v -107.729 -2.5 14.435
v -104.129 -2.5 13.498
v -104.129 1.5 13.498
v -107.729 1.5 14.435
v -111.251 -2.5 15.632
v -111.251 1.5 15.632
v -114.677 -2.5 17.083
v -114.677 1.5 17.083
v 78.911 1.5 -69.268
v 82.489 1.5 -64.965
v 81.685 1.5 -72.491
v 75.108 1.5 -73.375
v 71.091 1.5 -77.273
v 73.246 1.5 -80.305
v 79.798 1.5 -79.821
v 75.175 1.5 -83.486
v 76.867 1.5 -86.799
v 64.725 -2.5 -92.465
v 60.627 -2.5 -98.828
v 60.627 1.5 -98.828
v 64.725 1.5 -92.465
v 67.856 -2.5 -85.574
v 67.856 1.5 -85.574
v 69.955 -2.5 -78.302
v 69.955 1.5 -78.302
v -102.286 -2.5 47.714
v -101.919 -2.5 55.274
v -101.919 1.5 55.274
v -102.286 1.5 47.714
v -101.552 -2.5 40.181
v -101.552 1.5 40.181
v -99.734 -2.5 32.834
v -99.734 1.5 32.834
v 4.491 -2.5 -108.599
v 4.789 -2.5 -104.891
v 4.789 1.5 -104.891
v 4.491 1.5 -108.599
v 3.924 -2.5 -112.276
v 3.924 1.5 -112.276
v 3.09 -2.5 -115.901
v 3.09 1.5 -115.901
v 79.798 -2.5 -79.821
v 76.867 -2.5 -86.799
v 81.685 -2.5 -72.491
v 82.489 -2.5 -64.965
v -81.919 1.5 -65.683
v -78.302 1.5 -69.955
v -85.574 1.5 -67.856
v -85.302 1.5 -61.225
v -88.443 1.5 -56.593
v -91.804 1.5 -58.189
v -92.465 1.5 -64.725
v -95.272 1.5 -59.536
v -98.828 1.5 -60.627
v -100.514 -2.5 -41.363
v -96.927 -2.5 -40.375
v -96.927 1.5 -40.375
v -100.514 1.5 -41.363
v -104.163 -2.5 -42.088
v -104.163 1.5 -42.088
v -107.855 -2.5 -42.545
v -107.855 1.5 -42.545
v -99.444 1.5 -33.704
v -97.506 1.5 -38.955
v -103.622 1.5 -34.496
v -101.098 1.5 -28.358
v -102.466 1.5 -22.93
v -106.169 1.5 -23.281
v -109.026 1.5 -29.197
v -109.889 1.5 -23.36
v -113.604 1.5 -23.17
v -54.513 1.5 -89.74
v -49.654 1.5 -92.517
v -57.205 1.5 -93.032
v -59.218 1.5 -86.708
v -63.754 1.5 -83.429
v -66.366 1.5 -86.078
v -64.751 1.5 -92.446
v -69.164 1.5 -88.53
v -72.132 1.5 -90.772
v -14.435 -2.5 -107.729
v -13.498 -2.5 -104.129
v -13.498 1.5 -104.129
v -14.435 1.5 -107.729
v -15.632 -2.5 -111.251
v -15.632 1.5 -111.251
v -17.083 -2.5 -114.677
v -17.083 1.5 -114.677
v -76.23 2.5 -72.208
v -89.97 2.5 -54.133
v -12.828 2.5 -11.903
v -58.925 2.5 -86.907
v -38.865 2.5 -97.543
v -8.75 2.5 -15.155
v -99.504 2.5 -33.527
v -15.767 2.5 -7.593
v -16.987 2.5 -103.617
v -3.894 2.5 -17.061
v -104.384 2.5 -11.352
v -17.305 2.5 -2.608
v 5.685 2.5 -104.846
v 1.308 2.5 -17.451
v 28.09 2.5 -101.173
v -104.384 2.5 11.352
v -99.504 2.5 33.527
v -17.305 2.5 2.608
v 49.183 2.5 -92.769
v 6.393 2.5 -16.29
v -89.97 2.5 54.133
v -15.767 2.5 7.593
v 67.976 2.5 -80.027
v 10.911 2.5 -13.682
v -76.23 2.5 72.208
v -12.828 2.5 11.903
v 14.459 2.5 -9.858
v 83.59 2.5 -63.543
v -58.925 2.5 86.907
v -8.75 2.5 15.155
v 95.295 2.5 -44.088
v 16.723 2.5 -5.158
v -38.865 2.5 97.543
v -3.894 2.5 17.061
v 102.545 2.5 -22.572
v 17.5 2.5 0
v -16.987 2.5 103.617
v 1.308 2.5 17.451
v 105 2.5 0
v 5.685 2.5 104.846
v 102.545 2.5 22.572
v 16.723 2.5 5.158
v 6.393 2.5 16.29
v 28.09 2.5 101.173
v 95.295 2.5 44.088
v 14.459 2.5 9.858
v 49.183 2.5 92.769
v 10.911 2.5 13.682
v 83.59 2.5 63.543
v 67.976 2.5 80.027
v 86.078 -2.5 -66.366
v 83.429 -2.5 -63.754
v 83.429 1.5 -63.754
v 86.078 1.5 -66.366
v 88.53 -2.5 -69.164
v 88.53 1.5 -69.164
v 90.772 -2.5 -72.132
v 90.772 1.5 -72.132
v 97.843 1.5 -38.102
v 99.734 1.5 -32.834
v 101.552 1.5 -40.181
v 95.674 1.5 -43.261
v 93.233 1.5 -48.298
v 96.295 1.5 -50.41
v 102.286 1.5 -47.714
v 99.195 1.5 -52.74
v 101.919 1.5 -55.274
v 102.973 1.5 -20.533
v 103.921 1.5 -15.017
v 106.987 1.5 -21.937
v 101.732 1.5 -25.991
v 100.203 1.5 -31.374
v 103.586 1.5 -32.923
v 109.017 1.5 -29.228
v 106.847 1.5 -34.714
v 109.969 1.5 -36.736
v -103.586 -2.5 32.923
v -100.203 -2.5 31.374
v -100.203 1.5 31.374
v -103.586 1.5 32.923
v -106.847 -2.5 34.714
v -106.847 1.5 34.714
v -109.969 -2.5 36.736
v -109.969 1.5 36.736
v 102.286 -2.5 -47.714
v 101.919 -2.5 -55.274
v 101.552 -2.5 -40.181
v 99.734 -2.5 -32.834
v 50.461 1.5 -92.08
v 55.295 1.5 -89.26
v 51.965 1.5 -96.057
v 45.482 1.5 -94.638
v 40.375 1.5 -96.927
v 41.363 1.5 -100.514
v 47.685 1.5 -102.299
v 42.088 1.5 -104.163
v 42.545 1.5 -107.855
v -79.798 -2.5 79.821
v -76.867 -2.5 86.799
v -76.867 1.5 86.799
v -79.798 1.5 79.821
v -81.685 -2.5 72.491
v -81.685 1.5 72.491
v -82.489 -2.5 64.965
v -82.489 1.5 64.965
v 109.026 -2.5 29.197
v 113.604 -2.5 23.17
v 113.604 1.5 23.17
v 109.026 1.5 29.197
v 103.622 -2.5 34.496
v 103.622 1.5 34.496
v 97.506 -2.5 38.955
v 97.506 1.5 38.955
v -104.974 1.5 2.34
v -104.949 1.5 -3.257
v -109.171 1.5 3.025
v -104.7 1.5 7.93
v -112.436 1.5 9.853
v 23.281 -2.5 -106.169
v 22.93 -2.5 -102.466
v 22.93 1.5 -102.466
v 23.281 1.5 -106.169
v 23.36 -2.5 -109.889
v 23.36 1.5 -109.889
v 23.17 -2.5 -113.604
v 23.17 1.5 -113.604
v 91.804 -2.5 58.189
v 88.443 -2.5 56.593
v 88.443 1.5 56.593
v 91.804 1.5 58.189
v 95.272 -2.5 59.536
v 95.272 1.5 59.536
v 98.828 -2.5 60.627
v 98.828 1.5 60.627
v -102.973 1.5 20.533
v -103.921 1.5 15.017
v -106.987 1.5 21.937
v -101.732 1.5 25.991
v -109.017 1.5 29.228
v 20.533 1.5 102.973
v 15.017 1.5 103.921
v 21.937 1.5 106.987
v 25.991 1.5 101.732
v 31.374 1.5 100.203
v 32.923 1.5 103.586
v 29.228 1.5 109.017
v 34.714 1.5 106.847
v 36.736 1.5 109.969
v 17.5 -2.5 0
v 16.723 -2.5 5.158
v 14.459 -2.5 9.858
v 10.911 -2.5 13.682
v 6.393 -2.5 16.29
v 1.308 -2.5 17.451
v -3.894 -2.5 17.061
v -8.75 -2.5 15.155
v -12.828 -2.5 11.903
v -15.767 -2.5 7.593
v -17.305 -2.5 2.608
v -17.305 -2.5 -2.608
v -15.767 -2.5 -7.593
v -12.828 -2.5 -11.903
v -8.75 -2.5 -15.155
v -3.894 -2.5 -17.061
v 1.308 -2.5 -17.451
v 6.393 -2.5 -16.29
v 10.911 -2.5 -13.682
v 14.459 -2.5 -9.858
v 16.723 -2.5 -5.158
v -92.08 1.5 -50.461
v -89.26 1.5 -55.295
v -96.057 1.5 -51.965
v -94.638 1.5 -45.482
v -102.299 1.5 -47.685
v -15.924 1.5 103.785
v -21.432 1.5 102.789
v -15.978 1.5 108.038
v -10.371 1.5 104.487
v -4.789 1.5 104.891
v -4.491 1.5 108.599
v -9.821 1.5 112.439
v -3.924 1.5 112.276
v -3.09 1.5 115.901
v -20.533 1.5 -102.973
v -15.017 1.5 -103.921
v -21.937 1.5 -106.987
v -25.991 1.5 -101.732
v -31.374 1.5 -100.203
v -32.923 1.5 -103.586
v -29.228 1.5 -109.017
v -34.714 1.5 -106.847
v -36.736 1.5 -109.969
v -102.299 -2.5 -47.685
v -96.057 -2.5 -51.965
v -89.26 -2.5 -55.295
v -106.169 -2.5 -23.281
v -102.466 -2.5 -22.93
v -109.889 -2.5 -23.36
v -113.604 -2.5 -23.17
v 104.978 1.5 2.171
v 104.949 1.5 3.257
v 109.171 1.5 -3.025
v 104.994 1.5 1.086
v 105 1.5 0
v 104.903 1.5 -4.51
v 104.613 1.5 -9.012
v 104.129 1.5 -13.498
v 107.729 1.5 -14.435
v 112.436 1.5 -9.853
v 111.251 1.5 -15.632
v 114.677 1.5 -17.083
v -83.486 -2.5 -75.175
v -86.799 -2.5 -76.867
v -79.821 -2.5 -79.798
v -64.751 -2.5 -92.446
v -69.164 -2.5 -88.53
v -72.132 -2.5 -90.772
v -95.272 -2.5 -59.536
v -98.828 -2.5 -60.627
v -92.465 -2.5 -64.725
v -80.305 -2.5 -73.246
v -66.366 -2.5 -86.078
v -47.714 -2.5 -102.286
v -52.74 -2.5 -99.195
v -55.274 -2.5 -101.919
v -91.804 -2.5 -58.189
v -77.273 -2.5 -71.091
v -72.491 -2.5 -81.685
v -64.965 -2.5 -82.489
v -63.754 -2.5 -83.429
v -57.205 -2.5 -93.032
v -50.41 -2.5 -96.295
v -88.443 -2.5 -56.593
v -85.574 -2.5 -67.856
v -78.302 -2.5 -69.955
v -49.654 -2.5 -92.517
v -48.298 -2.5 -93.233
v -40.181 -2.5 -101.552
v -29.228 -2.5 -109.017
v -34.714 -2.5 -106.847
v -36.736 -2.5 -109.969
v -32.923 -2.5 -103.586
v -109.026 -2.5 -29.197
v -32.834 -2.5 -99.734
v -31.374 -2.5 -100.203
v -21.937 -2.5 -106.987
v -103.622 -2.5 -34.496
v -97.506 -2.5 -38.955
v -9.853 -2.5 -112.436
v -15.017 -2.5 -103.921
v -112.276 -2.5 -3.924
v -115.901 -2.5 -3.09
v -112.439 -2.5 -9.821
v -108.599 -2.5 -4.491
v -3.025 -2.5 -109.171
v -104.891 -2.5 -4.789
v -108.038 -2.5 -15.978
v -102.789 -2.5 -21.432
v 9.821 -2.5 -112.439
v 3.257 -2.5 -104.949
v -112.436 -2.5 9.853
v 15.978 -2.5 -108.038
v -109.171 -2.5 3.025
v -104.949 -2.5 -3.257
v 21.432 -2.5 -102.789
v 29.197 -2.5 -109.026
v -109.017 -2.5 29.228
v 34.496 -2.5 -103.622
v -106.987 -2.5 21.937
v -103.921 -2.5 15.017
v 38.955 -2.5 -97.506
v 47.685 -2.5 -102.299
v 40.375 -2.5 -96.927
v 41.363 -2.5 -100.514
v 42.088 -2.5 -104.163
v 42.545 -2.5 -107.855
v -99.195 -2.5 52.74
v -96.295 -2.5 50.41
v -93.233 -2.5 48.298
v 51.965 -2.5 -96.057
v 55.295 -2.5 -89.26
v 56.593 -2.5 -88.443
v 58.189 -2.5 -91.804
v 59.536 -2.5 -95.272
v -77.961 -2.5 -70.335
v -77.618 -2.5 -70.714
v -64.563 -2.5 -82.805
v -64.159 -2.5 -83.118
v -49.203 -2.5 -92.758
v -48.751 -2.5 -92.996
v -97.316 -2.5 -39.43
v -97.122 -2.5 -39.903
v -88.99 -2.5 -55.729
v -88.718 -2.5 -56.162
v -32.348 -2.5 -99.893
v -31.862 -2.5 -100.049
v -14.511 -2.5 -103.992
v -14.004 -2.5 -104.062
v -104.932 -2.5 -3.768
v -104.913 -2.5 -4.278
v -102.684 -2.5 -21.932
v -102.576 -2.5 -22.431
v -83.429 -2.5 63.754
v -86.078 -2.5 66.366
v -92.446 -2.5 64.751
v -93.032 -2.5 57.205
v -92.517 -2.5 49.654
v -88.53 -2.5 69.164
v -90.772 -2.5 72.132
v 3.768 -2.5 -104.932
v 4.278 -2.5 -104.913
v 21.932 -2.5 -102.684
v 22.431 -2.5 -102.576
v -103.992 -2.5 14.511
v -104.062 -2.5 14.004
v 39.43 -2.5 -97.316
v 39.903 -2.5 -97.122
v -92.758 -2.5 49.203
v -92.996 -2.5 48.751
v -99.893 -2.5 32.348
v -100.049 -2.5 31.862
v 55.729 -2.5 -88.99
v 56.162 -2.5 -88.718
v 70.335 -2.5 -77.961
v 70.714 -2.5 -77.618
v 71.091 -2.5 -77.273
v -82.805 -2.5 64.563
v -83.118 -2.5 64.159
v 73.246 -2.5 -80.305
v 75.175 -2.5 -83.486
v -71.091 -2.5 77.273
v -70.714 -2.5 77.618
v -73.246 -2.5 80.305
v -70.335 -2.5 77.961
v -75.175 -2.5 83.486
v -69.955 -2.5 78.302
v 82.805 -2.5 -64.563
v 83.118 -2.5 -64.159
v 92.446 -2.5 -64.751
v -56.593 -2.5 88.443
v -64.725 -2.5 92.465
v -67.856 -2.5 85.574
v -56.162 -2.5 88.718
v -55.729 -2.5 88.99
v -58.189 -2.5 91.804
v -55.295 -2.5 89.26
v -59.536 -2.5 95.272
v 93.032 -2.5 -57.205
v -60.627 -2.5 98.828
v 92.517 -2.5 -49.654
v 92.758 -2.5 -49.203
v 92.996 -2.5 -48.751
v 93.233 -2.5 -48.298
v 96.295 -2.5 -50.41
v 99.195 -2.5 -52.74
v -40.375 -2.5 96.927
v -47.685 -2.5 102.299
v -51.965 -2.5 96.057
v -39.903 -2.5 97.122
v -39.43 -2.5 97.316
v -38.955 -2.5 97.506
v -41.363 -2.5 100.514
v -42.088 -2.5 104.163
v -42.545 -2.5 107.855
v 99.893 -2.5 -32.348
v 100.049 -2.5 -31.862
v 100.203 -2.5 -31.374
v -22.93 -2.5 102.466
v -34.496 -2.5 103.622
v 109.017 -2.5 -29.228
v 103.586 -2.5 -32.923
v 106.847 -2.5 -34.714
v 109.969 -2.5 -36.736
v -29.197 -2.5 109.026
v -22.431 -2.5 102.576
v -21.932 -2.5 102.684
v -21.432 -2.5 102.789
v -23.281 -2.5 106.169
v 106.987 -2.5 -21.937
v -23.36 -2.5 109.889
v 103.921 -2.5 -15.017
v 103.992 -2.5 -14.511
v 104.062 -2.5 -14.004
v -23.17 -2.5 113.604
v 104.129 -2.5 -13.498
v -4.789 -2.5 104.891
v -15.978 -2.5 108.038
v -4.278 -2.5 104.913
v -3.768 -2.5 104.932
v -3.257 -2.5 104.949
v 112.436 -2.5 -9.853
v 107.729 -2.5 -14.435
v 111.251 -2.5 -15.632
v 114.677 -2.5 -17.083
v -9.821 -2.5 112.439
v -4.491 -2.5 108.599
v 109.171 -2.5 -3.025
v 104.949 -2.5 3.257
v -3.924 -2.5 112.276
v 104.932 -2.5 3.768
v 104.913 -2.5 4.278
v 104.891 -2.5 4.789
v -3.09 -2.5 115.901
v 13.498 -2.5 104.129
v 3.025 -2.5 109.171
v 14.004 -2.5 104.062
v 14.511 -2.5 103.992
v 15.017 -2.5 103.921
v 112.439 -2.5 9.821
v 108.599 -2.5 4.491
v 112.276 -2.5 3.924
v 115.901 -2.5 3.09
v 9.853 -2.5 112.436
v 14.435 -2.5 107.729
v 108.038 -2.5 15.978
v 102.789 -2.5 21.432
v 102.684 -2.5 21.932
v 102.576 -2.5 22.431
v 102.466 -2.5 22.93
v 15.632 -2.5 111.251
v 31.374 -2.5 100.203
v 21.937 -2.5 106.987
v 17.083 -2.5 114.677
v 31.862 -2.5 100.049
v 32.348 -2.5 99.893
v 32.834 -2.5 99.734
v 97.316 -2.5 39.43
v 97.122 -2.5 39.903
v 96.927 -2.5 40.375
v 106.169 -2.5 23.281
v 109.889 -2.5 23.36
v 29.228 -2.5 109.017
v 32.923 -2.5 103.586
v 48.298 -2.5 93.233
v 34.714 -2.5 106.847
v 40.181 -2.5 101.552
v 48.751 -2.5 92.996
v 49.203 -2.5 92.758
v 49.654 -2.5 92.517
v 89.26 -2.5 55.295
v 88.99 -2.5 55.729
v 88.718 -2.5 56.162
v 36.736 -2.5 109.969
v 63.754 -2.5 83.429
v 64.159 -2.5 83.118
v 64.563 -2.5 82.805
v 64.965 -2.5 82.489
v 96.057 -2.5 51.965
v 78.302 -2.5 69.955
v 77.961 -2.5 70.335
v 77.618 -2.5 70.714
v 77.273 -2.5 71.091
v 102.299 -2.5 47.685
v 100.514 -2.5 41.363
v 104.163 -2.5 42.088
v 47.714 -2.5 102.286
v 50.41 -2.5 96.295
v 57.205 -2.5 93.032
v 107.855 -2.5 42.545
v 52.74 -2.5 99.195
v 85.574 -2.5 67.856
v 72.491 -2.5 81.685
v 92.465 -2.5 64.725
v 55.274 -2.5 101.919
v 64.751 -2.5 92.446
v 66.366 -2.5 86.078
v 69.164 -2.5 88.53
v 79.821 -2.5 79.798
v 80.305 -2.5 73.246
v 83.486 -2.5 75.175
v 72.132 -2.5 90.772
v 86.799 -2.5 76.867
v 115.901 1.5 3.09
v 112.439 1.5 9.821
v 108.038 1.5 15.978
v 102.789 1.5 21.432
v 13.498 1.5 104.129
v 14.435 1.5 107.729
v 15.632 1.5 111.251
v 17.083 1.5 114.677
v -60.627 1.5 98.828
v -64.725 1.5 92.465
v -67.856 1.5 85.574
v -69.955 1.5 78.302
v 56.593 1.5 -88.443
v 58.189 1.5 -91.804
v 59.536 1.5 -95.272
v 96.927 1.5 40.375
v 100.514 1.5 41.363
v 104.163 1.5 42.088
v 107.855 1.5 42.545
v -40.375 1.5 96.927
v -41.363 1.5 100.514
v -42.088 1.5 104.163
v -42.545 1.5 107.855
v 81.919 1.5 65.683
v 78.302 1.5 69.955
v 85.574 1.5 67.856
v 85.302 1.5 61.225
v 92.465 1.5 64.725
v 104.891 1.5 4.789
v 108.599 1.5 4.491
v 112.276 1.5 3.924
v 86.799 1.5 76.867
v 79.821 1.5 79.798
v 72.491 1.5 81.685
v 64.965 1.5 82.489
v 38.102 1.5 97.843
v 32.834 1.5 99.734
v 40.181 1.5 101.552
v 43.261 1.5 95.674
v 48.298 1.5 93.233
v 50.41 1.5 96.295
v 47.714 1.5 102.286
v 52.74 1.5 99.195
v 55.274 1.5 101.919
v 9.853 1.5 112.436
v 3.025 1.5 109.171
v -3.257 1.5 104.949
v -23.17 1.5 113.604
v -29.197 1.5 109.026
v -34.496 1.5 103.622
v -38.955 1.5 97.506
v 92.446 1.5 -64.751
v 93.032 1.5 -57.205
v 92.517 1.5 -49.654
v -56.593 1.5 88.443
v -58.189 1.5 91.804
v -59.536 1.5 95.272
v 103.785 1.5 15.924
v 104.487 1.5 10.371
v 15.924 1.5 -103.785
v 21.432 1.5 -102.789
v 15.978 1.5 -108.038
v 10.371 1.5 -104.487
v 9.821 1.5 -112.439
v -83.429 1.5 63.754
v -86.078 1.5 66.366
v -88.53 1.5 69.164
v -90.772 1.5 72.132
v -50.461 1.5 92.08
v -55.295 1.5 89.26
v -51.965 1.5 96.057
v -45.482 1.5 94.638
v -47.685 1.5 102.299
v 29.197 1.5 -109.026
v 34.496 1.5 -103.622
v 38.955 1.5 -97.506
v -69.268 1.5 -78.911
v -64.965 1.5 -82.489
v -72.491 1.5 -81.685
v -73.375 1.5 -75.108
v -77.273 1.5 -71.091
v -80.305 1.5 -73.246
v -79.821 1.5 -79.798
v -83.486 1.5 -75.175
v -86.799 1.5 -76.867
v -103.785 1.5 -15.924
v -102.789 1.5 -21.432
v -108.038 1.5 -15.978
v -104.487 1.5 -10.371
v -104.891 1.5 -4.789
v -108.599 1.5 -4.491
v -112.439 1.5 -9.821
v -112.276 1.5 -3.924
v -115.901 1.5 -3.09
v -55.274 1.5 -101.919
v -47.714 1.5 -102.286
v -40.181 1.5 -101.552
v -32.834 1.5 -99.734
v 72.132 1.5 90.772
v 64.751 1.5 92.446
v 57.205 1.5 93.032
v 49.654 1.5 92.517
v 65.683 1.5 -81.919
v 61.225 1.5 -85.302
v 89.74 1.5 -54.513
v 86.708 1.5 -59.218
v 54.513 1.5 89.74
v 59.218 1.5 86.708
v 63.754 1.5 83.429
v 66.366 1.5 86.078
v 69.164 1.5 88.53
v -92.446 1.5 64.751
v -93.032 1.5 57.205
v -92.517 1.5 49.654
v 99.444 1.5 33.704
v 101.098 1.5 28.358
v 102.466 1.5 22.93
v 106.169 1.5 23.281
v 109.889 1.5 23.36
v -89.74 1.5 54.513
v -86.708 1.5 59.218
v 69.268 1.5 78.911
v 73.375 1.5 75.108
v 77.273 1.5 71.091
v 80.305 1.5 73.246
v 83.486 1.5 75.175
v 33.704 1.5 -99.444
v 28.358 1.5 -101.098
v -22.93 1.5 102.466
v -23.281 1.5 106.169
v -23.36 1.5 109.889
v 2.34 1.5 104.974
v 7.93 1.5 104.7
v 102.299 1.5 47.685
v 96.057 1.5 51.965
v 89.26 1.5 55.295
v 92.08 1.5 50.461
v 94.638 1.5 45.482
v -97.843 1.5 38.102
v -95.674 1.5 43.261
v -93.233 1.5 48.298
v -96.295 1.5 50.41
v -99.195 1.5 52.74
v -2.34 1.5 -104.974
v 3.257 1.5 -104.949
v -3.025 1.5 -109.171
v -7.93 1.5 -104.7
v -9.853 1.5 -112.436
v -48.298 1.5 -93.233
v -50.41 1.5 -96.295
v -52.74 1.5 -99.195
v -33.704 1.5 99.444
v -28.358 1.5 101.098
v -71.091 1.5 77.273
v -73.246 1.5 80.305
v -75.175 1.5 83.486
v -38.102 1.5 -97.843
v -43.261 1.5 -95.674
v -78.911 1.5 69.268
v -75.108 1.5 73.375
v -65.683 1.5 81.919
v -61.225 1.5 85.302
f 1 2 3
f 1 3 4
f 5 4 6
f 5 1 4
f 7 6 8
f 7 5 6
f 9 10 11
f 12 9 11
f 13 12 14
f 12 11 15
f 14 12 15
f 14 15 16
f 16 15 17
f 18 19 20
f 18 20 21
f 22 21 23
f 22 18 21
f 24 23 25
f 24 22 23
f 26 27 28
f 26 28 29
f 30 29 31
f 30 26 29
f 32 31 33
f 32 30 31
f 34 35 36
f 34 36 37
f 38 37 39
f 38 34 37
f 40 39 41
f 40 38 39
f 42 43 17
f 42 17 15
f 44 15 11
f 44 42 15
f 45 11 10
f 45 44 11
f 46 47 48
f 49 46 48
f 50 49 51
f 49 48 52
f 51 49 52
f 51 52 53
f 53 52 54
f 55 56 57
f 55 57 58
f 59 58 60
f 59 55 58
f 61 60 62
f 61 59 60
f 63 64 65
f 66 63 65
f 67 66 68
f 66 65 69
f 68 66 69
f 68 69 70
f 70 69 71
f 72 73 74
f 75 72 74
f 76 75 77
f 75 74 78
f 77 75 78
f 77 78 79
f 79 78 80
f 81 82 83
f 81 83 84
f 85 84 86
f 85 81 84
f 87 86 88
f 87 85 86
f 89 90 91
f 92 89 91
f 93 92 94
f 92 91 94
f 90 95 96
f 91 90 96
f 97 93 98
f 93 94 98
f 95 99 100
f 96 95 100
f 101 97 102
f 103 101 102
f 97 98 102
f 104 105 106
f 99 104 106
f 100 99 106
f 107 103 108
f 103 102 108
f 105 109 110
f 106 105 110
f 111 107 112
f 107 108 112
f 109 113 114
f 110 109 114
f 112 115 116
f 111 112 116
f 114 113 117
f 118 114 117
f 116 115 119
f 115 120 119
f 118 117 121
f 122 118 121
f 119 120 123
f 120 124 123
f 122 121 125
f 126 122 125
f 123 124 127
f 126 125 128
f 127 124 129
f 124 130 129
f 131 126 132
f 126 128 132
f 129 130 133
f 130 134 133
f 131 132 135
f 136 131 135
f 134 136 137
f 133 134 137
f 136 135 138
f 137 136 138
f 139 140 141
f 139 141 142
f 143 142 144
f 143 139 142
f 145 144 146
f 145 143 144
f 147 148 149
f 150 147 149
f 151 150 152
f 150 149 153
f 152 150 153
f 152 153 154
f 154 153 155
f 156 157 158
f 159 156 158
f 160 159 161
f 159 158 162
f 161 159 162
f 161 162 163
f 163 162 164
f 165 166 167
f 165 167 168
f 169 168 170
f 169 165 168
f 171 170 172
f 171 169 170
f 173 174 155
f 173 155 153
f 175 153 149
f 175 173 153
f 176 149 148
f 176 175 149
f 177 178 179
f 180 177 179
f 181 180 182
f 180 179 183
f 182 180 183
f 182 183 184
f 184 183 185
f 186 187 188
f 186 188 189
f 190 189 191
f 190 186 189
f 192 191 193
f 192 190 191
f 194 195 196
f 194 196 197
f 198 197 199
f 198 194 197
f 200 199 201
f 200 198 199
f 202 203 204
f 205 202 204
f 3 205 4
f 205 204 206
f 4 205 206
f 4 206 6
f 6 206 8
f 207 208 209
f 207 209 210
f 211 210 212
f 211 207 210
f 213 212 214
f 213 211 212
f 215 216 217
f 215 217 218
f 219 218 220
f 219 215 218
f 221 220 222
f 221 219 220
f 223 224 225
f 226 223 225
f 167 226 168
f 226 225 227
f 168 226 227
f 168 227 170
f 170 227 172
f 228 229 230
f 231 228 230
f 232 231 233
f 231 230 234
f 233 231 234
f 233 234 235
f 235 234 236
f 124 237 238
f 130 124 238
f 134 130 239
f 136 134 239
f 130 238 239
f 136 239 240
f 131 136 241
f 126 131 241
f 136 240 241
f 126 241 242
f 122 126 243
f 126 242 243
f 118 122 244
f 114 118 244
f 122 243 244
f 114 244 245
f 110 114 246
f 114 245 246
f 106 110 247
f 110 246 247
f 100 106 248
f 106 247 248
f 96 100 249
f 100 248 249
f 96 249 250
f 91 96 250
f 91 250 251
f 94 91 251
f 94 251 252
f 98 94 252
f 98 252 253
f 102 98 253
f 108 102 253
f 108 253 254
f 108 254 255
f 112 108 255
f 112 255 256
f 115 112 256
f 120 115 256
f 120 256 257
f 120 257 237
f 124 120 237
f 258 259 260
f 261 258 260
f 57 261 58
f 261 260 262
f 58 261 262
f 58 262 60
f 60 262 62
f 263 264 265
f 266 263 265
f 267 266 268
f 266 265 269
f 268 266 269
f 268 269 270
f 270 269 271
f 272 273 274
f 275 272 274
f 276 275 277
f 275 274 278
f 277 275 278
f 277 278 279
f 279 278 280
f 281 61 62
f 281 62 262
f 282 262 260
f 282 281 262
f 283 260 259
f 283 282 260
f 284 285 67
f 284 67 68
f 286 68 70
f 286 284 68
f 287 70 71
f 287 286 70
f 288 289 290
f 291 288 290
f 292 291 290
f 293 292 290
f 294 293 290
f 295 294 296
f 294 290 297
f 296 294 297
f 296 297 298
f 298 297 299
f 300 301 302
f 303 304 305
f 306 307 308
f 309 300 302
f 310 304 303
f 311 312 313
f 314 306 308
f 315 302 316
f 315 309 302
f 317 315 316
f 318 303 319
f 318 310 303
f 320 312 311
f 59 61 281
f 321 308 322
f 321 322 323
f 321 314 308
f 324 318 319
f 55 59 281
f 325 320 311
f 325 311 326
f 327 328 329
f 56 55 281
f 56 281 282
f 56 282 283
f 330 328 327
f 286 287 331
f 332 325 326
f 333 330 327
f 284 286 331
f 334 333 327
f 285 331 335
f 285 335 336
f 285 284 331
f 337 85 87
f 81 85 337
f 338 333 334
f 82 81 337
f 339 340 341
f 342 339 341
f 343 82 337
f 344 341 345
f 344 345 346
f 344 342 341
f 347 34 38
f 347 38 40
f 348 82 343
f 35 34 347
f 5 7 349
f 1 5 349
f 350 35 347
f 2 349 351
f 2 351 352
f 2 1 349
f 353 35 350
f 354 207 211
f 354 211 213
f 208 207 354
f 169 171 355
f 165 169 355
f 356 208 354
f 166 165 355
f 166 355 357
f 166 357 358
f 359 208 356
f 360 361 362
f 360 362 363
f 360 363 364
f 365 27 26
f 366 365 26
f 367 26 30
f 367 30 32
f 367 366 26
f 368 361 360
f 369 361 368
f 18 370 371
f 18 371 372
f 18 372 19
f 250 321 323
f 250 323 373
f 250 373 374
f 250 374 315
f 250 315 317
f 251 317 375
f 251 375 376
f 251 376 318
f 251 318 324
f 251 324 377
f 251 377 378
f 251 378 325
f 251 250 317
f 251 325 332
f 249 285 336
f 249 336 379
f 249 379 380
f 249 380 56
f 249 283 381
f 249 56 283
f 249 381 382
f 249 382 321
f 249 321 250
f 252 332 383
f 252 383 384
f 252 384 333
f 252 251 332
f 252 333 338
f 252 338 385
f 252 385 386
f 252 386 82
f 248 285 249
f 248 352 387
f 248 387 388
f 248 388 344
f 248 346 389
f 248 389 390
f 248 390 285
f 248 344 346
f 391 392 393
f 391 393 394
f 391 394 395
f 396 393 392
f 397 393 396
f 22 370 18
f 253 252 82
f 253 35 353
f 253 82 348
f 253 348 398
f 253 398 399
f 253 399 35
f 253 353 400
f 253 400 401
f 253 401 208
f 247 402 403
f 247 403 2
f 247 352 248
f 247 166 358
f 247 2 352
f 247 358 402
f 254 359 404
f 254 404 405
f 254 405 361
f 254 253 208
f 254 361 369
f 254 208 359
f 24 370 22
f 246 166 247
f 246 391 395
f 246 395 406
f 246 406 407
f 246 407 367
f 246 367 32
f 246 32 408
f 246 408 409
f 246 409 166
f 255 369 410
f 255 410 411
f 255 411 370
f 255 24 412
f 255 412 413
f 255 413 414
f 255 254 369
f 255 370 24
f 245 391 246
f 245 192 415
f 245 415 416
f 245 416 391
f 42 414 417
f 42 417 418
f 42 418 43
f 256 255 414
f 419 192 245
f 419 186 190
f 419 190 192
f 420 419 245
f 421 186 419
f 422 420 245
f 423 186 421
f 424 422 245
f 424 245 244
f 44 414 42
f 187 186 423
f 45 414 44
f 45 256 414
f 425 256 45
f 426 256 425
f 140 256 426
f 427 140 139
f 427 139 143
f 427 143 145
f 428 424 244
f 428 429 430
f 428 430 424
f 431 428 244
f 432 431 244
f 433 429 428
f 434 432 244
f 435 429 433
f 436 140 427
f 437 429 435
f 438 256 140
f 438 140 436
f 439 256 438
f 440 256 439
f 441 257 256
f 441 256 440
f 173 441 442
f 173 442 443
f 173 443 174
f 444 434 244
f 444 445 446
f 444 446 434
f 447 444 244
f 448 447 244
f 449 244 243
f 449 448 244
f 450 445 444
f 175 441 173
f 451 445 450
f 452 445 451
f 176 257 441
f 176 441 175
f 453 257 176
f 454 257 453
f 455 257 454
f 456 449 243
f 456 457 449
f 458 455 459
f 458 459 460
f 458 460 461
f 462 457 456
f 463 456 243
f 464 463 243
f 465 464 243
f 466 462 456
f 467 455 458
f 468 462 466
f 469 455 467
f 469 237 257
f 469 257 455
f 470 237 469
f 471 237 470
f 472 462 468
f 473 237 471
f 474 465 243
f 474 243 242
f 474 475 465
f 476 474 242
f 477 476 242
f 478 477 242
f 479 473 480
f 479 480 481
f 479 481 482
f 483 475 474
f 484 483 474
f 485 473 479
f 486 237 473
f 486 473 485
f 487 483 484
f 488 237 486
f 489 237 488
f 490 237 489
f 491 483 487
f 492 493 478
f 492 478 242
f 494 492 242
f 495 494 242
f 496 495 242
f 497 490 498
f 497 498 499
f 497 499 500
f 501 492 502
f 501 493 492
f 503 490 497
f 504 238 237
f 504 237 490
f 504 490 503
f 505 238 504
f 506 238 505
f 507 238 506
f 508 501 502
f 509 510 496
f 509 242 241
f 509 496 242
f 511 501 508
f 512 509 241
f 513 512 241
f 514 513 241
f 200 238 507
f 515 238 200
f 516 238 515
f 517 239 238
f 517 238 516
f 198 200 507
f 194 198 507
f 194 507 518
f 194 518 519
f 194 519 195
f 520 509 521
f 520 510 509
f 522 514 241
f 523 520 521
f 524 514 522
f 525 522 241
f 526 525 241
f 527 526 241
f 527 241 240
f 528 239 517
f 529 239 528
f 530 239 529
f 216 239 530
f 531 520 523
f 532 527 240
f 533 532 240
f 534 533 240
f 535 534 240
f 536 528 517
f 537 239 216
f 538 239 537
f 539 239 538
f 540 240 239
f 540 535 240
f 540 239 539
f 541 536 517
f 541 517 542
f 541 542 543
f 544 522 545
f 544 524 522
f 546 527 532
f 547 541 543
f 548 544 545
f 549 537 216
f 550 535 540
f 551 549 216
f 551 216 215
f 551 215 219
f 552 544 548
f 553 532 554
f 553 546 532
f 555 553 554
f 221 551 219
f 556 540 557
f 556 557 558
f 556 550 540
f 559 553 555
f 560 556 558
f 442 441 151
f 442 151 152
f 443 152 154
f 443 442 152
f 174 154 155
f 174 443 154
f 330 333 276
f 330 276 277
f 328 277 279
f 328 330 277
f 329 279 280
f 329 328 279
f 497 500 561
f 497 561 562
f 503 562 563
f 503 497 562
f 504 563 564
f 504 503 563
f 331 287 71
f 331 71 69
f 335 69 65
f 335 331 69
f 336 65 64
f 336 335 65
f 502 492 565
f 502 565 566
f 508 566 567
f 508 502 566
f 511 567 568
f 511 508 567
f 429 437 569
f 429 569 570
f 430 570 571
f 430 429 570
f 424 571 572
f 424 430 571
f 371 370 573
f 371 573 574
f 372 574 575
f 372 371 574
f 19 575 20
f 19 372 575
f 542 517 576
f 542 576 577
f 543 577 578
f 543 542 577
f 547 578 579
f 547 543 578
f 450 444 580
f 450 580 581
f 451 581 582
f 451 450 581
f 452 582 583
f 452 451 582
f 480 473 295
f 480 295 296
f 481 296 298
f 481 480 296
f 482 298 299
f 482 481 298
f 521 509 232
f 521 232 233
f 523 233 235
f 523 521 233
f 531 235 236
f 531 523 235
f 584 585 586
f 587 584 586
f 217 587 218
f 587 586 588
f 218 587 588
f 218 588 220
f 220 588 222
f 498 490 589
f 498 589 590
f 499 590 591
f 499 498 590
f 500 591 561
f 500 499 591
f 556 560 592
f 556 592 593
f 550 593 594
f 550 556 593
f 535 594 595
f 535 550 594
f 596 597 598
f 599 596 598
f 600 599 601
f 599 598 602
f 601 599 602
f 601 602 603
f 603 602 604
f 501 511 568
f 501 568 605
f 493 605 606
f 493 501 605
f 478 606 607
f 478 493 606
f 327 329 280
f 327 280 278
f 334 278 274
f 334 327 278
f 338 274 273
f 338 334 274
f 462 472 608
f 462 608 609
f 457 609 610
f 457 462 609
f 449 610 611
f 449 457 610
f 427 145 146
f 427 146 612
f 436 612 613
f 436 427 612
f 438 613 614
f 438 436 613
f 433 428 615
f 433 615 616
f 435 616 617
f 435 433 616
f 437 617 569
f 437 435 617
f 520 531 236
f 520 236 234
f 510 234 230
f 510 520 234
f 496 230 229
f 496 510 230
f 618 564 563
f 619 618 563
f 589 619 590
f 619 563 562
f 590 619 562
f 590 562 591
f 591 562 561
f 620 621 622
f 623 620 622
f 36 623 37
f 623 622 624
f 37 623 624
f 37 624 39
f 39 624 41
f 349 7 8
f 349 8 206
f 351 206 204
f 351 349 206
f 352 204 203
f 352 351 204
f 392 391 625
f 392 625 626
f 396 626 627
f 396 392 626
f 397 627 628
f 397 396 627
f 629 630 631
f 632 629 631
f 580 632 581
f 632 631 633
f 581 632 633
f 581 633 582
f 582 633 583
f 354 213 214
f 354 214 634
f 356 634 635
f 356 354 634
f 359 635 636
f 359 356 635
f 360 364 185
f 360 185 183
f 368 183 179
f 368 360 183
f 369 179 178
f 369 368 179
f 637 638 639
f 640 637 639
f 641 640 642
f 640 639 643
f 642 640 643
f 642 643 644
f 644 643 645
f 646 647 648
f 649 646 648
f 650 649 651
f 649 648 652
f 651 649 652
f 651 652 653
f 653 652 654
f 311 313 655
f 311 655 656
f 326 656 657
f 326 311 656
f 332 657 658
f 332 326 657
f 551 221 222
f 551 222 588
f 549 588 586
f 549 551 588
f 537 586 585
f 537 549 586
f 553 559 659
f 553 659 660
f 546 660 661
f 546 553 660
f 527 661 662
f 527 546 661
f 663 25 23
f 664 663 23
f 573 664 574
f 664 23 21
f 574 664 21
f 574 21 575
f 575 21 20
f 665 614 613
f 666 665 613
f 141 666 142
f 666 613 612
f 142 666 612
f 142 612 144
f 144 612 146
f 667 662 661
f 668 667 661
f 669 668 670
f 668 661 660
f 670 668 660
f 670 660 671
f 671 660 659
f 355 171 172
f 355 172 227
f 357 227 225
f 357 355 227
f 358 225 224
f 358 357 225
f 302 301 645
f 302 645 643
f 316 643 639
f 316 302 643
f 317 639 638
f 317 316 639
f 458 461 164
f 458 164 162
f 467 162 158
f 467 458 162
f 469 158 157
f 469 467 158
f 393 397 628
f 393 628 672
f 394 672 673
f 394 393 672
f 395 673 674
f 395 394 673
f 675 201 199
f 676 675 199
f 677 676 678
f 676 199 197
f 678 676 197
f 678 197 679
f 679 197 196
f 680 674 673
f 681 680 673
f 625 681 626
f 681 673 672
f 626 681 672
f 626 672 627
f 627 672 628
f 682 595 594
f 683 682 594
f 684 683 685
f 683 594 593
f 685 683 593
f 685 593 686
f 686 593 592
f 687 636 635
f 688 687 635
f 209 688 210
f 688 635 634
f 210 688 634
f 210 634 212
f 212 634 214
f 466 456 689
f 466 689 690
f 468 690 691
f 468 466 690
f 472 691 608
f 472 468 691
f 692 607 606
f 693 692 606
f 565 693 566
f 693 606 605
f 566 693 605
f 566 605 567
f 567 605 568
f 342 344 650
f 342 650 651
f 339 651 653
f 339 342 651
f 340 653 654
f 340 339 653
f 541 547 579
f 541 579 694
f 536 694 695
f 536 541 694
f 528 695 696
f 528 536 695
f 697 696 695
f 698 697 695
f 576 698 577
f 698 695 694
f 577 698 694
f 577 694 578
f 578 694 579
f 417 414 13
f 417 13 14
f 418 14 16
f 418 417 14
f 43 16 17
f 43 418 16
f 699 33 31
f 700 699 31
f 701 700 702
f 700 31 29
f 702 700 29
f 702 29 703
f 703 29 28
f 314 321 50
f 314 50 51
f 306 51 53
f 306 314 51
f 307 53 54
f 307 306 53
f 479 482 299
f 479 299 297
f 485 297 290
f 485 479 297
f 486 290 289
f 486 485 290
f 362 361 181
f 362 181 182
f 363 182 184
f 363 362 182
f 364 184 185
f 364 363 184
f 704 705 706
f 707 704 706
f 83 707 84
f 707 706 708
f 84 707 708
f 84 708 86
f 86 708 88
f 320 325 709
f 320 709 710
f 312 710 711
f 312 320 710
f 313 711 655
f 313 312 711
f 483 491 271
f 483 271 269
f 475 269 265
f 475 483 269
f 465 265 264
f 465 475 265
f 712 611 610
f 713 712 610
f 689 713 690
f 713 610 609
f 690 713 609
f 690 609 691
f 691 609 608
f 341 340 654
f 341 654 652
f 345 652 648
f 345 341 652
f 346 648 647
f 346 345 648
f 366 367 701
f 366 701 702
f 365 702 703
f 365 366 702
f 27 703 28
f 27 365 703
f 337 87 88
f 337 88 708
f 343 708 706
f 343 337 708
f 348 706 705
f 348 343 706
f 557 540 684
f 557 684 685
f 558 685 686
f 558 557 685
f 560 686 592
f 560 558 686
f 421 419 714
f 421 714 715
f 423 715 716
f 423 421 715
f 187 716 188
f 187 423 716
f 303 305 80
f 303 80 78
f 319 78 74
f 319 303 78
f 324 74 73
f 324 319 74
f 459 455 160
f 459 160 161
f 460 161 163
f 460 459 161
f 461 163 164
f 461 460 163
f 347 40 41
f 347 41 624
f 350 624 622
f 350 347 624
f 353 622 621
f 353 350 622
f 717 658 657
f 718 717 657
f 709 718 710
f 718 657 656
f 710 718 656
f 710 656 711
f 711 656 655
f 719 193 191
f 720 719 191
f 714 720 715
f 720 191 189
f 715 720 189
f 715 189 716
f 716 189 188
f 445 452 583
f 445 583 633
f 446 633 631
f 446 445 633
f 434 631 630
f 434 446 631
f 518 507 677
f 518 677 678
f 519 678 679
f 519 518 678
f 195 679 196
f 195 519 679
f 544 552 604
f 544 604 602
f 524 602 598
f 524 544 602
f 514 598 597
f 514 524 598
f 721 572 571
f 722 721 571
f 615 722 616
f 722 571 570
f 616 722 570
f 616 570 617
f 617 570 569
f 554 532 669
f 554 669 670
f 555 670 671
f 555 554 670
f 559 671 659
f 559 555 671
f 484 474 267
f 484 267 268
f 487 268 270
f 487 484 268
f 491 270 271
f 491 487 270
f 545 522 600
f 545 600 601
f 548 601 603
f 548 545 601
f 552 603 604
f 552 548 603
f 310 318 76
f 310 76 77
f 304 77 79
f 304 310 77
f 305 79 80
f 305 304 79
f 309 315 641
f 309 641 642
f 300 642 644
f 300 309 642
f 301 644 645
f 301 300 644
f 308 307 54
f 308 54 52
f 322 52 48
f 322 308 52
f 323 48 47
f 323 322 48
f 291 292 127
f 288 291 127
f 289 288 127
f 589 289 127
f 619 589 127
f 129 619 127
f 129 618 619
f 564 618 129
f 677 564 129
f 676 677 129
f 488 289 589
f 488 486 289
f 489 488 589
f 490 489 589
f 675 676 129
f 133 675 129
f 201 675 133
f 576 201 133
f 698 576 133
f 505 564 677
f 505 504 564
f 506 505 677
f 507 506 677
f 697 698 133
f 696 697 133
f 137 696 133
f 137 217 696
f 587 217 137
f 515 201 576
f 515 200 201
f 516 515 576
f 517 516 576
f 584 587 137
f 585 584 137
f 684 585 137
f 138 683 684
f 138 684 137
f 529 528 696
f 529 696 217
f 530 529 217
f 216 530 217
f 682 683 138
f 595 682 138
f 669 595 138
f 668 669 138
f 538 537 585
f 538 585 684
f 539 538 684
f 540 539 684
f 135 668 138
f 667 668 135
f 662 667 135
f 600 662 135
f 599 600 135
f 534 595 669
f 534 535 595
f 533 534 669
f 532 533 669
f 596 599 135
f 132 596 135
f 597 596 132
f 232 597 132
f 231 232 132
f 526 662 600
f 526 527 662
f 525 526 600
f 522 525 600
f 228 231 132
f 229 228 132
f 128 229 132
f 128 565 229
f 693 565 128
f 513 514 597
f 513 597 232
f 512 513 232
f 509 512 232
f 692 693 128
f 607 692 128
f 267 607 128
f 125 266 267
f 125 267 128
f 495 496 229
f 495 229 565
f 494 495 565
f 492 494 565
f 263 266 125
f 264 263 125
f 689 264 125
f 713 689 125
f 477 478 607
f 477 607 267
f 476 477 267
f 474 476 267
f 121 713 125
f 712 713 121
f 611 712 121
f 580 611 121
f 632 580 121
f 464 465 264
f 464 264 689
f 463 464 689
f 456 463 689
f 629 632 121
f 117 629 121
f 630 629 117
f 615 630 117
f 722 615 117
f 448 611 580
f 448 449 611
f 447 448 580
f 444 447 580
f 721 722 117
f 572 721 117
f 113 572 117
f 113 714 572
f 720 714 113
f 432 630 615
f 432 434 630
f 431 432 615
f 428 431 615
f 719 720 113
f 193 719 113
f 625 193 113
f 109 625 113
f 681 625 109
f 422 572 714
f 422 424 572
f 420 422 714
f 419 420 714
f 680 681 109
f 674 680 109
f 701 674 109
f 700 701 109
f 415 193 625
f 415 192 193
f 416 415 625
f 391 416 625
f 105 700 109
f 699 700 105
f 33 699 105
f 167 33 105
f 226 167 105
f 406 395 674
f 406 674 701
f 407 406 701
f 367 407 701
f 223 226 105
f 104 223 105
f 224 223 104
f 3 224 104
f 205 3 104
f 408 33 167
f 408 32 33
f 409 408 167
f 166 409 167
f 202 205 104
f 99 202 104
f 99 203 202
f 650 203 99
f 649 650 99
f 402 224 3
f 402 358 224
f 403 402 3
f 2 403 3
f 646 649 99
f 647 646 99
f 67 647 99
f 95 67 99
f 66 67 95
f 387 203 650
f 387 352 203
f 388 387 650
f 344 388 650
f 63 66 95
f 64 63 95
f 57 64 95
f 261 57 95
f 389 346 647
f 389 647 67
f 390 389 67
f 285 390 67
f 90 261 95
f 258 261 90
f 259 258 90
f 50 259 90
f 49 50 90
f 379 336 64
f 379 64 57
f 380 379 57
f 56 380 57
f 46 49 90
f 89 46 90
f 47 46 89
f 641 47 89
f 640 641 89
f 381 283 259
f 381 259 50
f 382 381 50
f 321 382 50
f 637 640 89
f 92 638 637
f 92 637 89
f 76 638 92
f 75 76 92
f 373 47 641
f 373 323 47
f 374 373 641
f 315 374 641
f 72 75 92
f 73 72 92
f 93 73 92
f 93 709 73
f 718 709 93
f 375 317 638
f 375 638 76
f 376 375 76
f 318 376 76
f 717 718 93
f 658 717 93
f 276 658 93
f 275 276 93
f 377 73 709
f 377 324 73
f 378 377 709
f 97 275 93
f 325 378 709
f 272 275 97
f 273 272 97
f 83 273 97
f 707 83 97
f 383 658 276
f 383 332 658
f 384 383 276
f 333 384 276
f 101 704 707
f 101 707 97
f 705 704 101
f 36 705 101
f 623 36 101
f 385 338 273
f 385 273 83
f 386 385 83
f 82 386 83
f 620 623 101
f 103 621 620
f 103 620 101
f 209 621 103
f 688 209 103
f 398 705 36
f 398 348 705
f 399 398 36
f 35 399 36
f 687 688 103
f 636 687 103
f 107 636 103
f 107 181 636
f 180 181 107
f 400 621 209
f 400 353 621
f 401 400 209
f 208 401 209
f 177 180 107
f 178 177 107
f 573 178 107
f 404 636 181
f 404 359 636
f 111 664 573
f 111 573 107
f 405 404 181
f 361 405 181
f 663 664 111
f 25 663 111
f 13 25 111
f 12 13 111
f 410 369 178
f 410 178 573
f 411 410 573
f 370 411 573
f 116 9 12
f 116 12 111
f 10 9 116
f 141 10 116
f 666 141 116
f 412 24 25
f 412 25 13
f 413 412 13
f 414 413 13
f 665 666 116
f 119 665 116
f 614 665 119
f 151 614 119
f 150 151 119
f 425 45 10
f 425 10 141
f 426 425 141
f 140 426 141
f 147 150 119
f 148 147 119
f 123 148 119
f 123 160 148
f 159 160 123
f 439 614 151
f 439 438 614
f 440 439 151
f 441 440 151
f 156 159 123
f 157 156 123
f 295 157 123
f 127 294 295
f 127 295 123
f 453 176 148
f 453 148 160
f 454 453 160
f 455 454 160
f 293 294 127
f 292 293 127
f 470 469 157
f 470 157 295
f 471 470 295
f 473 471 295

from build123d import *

# Parameters (mm, degrees)
F0_R     = 105
F1_DEPTH = 2.5
F3_DEPTH = 4
F4_COUNT = 36
F5_R     = 17.5
F6_DEPTH = 5.001


with BuildPart() as f1:
    # F0 (on Front) → F1 (new body, symmetric)
    with BuildSketch(Plane.XZ):
        Circle(F0_R)
    extrude(amount=F1_DEPTH, both=True)

    # F2 (on face) → F3 (join)
    with BuildSketch(Plane.XZ.offset(2.5)):
        with BuildLine():
            ThreePointArc((55.2742034197, 101.918682456), (43.9345614476, 102.0560942455), (32.8343328669, 99.7341796236))
            ThreePointArc((32.8343328669, 99.7341796236), (40.6961516971, 96.7926817329), (48.2978820486, 93.2325833044))
            ThreePointArc((48.2978820486, 93.2325833044), (51.548658511, 97.7662902282), (55.2742034197, 101.918682456))
        make_face()
    extrude(amount=-F3_DEPTH)

    # F4: F1 ×36 about axis
    f4_axis = Axis((0, 2.5, 0), (0, -1, 0))


with BuildPart() as f1_1:
    add(f1.part)
    for i in range(1, F4_COUNT):
        add(f1.part.rotate(f4_axis, i * 360 / F4_COUNT))

    # F5 (on face) → F6 (cut, through all)
    with BuildSketch(Plane.XZ.offset(2.5)):
        Circle(F5_R)
    extrude(amount=-F6_DEPTH, mode=Mode.SUBTRACT)


solid = f1_1.part
